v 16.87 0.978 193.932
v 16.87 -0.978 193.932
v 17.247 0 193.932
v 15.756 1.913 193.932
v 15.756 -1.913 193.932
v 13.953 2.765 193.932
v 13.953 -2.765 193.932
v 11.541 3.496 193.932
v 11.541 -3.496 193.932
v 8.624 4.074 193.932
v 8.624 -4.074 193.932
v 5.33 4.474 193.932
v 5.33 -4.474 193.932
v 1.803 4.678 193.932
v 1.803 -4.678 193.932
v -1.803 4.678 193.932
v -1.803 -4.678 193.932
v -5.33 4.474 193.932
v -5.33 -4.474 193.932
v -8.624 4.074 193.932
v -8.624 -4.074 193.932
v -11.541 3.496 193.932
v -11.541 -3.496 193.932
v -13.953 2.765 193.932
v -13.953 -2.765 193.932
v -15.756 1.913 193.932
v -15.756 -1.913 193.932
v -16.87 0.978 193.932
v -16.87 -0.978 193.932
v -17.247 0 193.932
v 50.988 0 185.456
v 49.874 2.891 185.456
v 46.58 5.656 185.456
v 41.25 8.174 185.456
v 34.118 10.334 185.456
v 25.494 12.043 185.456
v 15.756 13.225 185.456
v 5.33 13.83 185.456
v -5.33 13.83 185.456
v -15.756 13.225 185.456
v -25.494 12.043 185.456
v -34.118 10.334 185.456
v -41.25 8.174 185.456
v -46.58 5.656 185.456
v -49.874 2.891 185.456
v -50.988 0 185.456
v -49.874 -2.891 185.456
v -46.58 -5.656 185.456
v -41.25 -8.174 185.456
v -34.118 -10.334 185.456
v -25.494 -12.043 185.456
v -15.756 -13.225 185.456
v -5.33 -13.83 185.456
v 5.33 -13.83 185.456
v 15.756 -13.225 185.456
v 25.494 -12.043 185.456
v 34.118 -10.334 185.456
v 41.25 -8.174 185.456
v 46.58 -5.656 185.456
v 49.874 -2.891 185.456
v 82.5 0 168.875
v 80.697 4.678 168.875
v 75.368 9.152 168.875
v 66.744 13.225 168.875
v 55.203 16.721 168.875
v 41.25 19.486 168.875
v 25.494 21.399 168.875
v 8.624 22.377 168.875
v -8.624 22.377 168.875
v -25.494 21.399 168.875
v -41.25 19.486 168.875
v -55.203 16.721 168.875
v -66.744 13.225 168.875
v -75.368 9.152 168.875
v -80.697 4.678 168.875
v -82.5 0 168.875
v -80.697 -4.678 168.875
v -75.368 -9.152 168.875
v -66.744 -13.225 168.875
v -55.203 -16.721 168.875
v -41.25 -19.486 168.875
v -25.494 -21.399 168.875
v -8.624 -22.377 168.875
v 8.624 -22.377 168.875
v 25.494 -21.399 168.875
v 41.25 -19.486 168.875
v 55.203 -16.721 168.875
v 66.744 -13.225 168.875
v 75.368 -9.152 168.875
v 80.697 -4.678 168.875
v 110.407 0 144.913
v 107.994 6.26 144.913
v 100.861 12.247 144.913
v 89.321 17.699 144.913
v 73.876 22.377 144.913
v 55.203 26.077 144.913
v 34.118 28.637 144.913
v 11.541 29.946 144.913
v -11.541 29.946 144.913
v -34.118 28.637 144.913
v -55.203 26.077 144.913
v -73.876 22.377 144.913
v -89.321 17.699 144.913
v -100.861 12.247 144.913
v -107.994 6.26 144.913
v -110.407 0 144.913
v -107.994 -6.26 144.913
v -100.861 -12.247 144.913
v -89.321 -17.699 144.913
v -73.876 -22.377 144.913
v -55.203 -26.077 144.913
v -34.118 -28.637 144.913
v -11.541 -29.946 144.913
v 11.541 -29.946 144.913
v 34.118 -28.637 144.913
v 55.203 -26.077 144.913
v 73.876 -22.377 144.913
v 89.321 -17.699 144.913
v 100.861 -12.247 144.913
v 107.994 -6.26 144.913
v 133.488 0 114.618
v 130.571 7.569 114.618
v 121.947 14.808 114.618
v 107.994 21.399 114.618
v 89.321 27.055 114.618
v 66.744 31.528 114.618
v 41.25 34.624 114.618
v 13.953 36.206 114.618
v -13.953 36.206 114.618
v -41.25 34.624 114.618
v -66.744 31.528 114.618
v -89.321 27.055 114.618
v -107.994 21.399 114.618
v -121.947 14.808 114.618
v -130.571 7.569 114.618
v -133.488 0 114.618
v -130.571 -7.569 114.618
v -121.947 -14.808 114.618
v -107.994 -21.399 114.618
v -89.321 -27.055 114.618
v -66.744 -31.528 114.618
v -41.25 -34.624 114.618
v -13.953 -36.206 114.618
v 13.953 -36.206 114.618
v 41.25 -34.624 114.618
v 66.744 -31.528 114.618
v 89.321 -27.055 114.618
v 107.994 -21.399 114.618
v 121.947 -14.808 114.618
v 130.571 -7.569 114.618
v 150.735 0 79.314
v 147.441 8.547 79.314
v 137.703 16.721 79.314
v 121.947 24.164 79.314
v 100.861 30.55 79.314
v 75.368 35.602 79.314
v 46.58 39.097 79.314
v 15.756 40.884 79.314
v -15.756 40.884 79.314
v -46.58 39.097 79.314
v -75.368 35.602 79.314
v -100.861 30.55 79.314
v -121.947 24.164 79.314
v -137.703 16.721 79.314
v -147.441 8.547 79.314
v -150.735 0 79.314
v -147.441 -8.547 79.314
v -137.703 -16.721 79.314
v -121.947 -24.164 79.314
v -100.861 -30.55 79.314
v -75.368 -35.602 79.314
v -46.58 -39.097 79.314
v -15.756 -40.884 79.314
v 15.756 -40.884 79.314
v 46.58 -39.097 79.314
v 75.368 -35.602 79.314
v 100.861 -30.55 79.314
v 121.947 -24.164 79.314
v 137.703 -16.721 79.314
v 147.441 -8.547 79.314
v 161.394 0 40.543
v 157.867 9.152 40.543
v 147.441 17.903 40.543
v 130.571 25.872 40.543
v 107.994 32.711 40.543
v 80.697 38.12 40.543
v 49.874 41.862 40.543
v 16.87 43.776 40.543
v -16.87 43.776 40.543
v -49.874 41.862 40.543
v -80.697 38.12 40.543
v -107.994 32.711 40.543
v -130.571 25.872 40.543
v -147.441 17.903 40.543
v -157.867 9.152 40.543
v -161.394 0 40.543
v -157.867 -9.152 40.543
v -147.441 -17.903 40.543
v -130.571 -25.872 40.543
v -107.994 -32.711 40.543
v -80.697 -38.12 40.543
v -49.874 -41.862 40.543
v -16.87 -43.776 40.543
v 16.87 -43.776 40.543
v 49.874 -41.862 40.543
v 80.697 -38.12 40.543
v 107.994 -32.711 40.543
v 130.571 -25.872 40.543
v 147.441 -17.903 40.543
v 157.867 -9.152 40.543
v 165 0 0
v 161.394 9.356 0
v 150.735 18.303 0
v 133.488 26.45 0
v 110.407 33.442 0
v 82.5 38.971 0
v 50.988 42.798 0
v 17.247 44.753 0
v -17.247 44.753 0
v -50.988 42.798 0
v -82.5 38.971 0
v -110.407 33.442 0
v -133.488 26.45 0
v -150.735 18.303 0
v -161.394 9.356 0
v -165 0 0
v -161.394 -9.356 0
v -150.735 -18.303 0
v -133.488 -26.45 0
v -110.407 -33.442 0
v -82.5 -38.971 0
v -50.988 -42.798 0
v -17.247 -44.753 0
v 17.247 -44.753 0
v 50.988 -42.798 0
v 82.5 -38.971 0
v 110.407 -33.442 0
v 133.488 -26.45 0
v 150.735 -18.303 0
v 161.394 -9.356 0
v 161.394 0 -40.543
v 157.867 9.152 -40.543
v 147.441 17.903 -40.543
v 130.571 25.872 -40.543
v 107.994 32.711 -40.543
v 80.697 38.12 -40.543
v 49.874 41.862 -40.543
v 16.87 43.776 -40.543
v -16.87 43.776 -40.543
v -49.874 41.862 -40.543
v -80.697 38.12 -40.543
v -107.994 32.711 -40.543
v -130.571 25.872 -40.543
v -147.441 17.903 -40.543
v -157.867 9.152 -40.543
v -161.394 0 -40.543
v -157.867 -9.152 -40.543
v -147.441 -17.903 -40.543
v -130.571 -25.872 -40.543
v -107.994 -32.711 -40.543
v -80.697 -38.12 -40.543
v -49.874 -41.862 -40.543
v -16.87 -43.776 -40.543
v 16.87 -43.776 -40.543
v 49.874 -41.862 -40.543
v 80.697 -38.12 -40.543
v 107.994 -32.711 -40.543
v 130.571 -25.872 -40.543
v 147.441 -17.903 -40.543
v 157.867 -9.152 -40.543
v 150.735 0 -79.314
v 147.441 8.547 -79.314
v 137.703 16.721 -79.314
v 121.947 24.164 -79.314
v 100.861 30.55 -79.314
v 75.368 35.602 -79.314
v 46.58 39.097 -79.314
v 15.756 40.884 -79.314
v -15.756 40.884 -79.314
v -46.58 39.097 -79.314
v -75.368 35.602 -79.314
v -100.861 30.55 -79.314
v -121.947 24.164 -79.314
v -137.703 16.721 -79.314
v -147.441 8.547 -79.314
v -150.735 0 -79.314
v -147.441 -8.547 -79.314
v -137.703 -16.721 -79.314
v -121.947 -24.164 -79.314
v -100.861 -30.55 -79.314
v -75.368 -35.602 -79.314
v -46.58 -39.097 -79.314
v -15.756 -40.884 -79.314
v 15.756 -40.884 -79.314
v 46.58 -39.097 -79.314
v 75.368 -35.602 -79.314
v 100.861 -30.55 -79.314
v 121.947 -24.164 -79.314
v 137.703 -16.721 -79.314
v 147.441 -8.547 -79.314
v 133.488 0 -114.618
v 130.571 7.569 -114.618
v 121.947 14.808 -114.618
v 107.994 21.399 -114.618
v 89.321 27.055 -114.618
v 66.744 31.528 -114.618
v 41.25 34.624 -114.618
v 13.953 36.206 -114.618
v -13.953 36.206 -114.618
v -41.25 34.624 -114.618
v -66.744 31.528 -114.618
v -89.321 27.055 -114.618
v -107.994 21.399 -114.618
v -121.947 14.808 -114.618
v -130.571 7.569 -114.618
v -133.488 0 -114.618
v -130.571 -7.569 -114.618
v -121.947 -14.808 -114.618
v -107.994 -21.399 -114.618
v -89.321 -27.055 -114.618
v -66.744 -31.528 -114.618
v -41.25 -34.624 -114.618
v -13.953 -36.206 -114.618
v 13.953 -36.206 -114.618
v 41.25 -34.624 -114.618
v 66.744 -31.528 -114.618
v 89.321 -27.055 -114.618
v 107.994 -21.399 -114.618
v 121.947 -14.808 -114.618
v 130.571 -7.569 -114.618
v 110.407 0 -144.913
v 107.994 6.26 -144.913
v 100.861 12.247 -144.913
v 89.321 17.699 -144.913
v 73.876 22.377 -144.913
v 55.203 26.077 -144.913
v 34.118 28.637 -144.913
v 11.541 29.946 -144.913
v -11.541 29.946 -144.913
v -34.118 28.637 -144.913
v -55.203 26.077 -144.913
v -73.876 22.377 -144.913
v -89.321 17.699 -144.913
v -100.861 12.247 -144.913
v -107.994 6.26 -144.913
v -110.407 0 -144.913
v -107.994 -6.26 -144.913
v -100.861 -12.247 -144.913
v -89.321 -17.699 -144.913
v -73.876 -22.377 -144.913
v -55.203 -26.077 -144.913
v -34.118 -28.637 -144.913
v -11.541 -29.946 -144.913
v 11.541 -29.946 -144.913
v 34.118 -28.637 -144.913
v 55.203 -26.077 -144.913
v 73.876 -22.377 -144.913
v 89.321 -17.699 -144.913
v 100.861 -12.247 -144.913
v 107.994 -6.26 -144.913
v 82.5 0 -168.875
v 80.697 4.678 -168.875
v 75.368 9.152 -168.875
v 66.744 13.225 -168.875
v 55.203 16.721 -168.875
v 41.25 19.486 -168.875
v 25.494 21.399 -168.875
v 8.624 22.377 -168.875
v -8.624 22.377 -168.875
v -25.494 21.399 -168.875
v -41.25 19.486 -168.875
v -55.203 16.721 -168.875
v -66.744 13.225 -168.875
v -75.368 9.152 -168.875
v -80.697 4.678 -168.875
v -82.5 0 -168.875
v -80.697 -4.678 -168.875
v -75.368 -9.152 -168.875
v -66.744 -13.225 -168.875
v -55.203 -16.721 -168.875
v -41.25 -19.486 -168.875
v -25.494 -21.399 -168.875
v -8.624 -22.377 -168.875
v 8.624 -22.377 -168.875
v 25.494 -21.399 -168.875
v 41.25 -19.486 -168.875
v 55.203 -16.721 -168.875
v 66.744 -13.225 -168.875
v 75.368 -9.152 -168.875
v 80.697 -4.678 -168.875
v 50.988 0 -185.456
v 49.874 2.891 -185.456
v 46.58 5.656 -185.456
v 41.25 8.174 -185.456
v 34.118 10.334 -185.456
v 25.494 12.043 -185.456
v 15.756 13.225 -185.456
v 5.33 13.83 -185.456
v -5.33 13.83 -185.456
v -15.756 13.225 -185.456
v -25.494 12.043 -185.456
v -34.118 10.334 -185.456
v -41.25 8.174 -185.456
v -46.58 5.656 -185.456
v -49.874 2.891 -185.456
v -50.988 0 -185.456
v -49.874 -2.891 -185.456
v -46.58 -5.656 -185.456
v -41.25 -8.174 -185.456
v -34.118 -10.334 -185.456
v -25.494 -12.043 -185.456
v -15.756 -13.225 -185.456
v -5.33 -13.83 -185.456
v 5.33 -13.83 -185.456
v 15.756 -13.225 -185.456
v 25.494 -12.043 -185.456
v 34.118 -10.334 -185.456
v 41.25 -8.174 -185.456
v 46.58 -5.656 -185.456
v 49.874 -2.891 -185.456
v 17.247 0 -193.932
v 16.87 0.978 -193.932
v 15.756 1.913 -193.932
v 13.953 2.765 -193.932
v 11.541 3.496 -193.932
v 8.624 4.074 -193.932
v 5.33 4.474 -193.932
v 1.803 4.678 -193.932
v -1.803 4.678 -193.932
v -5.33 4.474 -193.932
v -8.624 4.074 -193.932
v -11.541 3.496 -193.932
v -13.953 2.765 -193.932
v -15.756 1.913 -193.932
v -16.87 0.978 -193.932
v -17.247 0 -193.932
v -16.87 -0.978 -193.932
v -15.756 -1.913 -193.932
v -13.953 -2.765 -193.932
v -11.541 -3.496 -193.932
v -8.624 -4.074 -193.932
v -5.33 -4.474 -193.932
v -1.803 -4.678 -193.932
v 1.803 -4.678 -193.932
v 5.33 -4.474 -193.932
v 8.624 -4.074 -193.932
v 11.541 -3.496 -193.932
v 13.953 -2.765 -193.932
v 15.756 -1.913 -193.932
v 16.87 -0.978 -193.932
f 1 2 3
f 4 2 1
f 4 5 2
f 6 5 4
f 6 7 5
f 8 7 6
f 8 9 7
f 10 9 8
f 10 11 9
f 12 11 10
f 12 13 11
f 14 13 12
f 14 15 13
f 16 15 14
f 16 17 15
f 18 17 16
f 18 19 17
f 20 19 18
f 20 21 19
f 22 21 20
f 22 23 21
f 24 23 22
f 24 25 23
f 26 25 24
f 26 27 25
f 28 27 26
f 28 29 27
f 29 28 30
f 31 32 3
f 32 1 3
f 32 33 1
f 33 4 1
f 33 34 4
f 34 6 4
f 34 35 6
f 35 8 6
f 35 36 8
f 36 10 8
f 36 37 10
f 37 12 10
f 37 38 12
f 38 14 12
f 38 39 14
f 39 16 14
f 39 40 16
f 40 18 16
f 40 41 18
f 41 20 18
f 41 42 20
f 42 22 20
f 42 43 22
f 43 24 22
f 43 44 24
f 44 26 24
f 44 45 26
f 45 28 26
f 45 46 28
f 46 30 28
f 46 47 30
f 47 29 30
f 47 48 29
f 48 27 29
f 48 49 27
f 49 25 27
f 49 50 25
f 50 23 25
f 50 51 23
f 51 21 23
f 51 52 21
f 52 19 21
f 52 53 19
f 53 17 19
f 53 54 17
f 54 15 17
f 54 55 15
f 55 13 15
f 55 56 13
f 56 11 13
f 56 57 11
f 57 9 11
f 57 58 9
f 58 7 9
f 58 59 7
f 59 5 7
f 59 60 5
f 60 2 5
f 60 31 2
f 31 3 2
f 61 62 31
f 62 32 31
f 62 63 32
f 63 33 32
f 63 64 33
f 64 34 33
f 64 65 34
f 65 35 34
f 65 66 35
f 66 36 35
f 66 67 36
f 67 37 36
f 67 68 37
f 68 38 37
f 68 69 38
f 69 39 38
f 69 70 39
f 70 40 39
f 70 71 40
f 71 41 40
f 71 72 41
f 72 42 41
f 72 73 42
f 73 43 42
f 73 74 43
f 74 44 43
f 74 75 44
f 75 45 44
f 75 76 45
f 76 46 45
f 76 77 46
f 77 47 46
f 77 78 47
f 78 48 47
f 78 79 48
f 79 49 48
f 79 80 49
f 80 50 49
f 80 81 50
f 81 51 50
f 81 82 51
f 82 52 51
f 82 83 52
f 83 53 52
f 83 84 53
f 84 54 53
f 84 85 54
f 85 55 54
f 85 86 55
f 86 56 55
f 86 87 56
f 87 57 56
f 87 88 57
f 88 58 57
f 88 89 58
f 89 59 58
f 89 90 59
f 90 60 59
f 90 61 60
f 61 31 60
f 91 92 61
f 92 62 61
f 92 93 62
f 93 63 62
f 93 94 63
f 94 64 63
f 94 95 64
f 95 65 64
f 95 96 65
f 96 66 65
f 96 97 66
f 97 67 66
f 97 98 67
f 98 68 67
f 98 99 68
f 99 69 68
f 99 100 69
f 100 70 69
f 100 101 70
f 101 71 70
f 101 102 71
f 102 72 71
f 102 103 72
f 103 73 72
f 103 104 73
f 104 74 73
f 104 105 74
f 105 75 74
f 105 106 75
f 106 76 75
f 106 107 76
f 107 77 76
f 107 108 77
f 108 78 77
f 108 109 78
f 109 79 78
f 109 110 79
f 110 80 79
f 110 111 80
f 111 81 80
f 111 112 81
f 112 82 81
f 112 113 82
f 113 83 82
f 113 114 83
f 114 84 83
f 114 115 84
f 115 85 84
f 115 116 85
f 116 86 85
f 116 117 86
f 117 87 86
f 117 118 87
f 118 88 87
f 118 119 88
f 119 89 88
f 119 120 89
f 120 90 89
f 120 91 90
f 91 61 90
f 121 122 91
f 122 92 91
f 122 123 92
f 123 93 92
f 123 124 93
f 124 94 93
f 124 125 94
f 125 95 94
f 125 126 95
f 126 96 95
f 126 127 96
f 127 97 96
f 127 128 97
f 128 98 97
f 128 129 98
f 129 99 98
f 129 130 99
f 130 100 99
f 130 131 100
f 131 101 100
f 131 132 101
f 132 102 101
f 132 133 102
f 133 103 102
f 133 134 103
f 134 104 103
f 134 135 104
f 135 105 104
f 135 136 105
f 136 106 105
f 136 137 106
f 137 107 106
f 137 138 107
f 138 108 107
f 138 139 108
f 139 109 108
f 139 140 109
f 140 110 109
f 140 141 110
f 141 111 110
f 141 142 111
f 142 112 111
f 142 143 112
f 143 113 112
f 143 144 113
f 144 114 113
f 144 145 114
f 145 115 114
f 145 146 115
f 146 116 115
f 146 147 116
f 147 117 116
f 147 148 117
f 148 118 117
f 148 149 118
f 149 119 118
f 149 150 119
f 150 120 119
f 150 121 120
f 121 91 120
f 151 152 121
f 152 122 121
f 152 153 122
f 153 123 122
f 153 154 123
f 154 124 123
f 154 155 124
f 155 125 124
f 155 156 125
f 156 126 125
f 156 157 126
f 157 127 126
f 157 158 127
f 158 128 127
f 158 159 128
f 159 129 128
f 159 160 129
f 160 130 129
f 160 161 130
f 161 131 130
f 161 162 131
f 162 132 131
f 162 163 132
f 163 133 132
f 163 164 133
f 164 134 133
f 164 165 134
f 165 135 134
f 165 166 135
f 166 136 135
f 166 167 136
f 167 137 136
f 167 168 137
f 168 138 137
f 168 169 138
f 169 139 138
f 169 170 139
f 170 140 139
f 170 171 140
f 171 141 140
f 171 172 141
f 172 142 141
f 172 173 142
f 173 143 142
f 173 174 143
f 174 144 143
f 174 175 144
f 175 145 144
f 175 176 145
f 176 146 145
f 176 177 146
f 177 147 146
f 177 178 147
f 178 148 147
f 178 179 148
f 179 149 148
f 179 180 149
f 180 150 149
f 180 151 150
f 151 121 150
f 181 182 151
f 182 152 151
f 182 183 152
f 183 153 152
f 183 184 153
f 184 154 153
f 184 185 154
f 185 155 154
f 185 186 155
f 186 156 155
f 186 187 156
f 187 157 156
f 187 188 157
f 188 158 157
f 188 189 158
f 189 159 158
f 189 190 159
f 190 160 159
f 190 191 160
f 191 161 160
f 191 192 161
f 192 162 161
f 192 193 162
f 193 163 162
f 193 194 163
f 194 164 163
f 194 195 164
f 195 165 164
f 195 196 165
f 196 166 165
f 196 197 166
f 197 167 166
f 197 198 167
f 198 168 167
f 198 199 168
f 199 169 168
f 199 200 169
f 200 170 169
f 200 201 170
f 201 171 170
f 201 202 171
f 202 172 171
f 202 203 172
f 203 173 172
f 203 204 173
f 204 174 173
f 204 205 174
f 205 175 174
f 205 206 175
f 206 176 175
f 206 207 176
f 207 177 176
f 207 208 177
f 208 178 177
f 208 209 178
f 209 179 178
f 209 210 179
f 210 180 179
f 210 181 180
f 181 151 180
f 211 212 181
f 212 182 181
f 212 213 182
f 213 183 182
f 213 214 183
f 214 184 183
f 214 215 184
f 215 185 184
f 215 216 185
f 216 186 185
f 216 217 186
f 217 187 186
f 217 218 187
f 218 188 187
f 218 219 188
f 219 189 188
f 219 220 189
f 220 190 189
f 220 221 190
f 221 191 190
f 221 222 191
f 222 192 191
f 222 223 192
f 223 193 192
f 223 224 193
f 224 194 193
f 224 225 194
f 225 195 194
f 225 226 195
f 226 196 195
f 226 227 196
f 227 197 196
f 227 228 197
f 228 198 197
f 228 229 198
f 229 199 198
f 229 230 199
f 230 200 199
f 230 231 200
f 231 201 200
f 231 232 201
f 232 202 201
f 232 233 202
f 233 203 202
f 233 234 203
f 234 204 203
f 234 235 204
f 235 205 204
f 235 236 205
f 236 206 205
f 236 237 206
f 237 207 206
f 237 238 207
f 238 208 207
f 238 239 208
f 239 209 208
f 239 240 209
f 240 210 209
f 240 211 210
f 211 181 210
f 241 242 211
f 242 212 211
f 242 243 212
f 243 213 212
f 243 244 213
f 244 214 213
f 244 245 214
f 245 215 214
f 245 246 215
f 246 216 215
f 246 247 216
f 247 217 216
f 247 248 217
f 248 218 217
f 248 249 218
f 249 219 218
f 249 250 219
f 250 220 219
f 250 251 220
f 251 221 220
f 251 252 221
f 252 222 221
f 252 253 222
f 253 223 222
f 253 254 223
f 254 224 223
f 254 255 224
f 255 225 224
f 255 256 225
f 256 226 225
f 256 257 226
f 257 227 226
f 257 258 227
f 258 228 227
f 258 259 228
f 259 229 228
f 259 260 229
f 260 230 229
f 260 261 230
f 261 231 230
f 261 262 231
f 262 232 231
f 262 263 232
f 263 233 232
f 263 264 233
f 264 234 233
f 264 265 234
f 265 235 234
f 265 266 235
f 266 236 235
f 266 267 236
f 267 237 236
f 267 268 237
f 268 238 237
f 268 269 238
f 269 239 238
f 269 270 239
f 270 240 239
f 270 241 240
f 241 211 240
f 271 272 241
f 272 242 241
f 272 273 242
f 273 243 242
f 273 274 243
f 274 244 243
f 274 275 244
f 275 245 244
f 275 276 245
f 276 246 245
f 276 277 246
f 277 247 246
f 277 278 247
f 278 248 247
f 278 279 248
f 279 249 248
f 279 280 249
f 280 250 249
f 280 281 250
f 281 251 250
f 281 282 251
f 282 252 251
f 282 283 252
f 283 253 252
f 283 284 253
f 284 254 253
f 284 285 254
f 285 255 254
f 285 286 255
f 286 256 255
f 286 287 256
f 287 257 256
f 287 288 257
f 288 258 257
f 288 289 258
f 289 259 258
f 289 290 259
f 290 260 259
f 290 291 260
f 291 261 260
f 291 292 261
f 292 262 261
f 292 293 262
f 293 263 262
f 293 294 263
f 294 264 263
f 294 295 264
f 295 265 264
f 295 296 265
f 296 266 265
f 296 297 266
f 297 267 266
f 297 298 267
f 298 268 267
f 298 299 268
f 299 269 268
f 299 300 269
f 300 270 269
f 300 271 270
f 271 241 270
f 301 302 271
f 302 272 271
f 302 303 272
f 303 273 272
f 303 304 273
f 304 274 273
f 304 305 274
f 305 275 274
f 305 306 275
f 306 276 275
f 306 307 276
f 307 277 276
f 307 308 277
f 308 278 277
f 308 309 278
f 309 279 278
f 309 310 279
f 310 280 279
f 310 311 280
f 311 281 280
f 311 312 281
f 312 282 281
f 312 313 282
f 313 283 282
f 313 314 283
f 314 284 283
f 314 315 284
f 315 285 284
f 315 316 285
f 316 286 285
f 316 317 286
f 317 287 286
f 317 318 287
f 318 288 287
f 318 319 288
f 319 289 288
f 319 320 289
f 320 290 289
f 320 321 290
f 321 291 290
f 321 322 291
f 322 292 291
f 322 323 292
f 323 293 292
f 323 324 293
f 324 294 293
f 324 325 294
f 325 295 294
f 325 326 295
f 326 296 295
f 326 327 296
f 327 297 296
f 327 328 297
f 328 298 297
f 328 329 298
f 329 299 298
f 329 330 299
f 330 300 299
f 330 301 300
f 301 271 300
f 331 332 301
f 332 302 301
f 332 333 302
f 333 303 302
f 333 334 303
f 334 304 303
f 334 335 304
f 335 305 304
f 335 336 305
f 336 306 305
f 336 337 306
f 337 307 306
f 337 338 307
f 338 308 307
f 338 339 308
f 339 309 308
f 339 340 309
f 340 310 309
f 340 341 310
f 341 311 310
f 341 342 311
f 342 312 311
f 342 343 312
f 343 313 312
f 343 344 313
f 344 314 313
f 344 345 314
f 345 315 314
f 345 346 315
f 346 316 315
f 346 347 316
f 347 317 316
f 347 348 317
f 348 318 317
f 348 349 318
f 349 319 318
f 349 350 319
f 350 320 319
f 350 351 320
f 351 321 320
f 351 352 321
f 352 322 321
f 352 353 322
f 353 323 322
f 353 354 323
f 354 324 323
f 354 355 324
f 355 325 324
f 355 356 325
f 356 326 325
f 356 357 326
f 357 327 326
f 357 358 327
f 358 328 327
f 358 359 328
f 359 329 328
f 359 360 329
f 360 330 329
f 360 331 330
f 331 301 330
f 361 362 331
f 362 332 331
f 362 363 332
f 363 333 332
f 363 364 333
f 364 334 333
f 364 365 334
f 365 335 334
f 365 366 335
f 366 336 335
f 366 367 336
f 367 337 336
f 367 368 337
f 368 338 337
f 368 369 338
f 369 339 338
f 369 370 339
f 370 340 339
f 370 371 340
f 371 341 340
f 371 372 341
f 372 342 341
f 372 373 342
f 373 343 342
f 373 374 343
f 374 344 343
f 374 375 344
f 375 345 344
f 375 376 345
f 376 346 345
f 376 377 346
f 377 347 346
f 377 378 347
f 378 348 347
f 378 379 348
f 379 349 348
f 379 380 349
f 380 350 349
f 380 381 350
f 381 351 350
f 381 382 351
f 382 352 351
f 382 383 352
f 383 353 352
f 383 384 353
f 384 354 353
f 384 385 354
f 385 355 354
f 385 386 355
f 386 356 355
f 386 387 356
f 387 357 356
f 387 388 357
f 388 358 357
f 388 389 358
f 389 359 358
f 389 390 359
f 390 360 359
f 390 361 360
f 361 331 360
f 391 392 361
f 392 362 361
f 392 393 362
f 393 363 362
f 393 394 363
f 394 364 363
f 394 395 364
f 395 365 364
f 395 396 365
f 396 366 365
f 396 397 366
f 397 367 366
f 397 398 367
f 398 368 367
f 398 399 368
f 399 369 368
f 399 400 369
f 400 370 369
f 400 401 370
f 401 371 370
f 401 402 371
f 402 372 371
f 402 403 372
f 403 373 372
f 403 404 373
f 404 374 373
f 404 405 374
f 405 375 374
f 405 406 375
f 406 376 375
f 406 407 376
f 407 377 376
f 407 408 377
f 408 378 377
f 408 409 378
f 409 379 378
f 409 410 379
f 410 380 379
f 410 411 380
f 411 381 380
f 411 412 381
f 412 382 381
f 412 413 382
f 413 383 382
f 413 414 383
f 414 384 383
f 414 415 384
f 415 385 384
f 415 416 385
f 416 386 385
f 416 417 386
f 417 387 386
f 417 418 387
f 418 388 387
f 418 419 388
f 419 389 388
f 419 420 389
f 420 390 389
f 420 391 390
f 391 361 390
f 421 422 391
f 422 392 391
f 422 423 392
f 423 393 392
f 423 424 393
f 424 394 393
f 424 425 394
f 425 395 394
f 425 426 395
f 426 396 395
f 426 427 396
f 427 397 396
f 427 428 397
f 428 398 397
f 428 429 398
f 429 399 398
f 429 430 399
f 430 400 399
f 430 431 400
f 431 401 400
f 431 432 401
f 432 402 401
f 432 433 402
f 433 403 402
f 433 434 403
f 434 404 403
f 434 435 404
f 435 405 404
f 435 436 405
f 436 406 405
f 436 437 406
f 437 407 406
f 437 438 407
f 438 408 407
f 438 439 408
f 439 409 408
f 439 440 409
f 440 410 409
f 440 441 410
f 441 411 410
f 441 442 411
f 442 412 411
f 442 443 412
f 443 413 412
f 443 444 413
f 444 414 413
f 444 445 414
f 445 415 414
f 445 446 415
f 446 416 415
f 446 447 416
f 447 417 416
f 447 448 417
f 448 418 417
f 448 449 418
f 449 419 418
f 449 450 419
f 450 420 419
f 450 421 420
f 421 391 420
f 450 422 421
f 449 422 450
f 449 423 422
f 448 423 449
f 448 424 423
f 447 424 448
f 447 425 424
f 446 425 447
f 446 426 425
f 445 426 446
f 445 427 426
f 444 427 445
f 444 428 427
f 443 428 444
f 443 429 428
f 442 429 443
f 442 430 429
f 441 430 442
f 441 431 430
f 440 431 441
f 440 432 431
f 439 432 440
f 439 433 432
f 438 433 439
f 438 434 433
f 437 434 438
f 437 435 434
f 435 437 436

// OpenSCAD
// Generated by SolidPython 1.0.1 on 2020-07-29 00:46:49


scale(v = [11, 3, 13]) {
	sphere(r = 15);
}
/***********************************************
*********      SolidPython code:      **********
************************************************
 
# import packages: SolidPython
from solid import *
from solid.utils import *
from itertools import chain, combinations, permutations


class Resize:

    def __init__(self, scad_file):
        self.scad_file = scad_file
        #self.scad_file = import_scad(scad_file)
        # cone/cylinder param:
        self.r1 = 0
        self.r2 = 0
        self.h = 0
        # rectangular prism param:
        self.w = 0
        self.l = 0
        # ellipse param:
        self.r = 0

    # import OpenScad code (file name corresponds to shape)


    # classify shape + parameters
    def assign(self, param1, param2, param3):
        if self.scad_file == 'cone.scad':
            self.r1 = param1
            self.r2 = param2
            self.h = param3
        elif self.scad_file == 'cylinder.scad':
            self.r1 = param1
            self.r2 = param2
            self.h = param3
        elif self.scad_file == 'rectangularPrism.scad':
            self.h = param1
            self.l = param2
            self.w = param3
        else:
            self.r = param1
            self.h = param2

    # resize parameters
    def iterate(self):
        x = range(3, 20, 2)
        i = 1
        if self.scad_file == 'cone.scad':
            tempList = list(permutations(x, 2))
            for temp in tempList:
                param1 = temp[0]
                param2 = temp[1]
                filepath = 'produced_scad_files/' + 'cone' + str(param1) + '_' + str(param2) + '_' + '.scad'
                scad_render_to_file(cylinder(h=param1, r1=param2, r2=0), filepath)

        elif self.scad_file == 'cylinder.scad':
            tempList = list(permutations(x, 3))
            for temp in tempList:
                param1 = temp[0]
                param2 = temp[1]
                filepath = 'produced_scad_files/' + 'cylinder' + str(param1) + '_' + str(param2) + '_' + '.scad'
                scad_render_to_file(cylinder(h=param1, r1=param2, r2=param2), filepath)

        elif self.scad_file == 'rectangularPrism.scad':
            tempList = list(permutations(x, 3))
            for temp in tempList:
                param1 = temp[0]
                param2 = temp[1]
                param3 = temp[2]
                filepath = 'produced_scad_files/' + 'rectangularPrism' + str(param1) + '_' + str(param2) + '_' + str(
                    param3) + '.scad'
                scad_render_to_file(cube(size=(param1, param2, param3)), filepath)

        elif self.scad_file == 'ellipse.scad':
            tempList = list(permutations(x, 4))
            for temp in tempList:
                param1 = temp[0]
                param2 = temp[1]
                param3 = temp[2]
                param4 = temp[3]
                filepath = 'produced_scad_files/' + 'ellipse' + str(param1) + '_' + str(param2) + '_' + str(param3) + '_' + str(param4) + '.scad'
                scad_render_to_file(scale([param1, param2, param3])(sphere(r=param4)), filepath)

    def render_to_scadfile(self):
        scad_render_to_file(scad, 'example.scad') 
 
************************************************/
